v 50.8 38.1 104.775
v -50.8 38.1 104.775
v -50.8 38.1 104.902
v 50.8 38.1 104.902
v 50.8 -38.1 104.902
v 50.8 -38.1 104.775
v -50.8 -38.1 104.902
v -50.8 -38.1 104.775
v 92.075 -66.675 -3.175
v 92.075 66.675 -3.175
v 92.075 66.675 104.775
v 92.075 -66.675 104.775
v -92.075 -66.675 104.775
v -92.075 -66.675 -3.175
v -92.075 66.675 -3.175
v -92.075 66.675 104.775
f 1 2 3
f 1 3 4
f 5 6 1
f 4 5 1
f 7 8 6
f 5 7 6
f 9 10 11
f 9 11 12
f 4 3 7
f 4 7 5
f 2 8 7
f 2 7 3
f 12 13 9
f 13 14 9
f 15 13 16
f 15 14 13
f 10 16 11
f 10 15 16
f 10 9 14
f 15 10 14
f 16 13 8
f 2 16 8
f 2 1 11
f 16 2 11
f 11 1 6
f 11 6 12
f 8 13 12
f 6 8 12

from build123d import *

# Parameters (mm, degrees)
SKETCH1_W           = 177.8
SKETCH1_H           = 127
BOSS_EXTRUDE1_DEPTH = 101.6
MOVE_FACE1_BY       = 3.175
MOVE_FACE1_2_BY     = 3.175
MOVE_FACE1_3_BY     = 3.175
MOVE_FACE1_4_BY     = 3.175
MOVE_FACE1_5_BY     = 3.175
MOVE_FACE1_6_BY     = 3.175
SKETCH2_W           = 101.6
SKETCH2_H           = 76.2
BOSS_EXTRUDE2_DEPTH = 0.127


with BuildPart() as part:
    # Sketch1 → Boss-Extrude1 (new body)
    with BuildSketch(Plane.XY):
        Rectangle(SKETCH1_W, SKETCH1_H)
    extrude(amount=BOSS_EXTRUDE1_DEPTH)

    # Move Face1: a face moved outward by 3.175
    extrude(part.faces().sort_by_distance((0, -63.5, 50.8))[0], amount=MOVE_FACE1_BY, dir=(0, -1, 0))

    # Move Face1 2: a face moved outward by 3.175
    extrude(part.faces().sort_by_distance((0, 0, 0))[0], amount=MOVE_FACE1_2_BY, dir=(0, 0, -1))

    # Move Face1 3: a face moved outward by 3.175
    extrude(part.faces().sort_by_distance((-88.9, 0, 50.8))[0], amount=MOVE_FACE1_3_BY, dir=(-1, 0, 0))

    # Move Face1 4: a face moved outward by 3.175
    extrude(part.faces().sort_by_distance((88.9, 0, 50.8))[0], amount=MOVE_FACE1_4_BY, dir=(1, 0, 0))

    # Move Face1 5: a face moved outward by 3.175
    extrude(part.faces().sort_by_distance((0, 63.5, 50.8))[0], amount=MOVE_FACE1_5_BY, dir=(0, 1, 0))

    # Move Face1 6: a face moved outward by 3.175
    extrude(part.faces().sort_by_distance((0, 0, 101.6))[0], amount=MOVE_FACE1_6_BY, dir=(0, 0, 1))

    # Sketch2 → Boss-Extrude2 (add)
    with BuildSketch(Plane.XY.offset(104.775)):
        Rectangle(SKETCH2_W, SKETCH2_H)
    extrude(amount=BOSS_EXTRUDE2_DEPTH)


solid = part.part
